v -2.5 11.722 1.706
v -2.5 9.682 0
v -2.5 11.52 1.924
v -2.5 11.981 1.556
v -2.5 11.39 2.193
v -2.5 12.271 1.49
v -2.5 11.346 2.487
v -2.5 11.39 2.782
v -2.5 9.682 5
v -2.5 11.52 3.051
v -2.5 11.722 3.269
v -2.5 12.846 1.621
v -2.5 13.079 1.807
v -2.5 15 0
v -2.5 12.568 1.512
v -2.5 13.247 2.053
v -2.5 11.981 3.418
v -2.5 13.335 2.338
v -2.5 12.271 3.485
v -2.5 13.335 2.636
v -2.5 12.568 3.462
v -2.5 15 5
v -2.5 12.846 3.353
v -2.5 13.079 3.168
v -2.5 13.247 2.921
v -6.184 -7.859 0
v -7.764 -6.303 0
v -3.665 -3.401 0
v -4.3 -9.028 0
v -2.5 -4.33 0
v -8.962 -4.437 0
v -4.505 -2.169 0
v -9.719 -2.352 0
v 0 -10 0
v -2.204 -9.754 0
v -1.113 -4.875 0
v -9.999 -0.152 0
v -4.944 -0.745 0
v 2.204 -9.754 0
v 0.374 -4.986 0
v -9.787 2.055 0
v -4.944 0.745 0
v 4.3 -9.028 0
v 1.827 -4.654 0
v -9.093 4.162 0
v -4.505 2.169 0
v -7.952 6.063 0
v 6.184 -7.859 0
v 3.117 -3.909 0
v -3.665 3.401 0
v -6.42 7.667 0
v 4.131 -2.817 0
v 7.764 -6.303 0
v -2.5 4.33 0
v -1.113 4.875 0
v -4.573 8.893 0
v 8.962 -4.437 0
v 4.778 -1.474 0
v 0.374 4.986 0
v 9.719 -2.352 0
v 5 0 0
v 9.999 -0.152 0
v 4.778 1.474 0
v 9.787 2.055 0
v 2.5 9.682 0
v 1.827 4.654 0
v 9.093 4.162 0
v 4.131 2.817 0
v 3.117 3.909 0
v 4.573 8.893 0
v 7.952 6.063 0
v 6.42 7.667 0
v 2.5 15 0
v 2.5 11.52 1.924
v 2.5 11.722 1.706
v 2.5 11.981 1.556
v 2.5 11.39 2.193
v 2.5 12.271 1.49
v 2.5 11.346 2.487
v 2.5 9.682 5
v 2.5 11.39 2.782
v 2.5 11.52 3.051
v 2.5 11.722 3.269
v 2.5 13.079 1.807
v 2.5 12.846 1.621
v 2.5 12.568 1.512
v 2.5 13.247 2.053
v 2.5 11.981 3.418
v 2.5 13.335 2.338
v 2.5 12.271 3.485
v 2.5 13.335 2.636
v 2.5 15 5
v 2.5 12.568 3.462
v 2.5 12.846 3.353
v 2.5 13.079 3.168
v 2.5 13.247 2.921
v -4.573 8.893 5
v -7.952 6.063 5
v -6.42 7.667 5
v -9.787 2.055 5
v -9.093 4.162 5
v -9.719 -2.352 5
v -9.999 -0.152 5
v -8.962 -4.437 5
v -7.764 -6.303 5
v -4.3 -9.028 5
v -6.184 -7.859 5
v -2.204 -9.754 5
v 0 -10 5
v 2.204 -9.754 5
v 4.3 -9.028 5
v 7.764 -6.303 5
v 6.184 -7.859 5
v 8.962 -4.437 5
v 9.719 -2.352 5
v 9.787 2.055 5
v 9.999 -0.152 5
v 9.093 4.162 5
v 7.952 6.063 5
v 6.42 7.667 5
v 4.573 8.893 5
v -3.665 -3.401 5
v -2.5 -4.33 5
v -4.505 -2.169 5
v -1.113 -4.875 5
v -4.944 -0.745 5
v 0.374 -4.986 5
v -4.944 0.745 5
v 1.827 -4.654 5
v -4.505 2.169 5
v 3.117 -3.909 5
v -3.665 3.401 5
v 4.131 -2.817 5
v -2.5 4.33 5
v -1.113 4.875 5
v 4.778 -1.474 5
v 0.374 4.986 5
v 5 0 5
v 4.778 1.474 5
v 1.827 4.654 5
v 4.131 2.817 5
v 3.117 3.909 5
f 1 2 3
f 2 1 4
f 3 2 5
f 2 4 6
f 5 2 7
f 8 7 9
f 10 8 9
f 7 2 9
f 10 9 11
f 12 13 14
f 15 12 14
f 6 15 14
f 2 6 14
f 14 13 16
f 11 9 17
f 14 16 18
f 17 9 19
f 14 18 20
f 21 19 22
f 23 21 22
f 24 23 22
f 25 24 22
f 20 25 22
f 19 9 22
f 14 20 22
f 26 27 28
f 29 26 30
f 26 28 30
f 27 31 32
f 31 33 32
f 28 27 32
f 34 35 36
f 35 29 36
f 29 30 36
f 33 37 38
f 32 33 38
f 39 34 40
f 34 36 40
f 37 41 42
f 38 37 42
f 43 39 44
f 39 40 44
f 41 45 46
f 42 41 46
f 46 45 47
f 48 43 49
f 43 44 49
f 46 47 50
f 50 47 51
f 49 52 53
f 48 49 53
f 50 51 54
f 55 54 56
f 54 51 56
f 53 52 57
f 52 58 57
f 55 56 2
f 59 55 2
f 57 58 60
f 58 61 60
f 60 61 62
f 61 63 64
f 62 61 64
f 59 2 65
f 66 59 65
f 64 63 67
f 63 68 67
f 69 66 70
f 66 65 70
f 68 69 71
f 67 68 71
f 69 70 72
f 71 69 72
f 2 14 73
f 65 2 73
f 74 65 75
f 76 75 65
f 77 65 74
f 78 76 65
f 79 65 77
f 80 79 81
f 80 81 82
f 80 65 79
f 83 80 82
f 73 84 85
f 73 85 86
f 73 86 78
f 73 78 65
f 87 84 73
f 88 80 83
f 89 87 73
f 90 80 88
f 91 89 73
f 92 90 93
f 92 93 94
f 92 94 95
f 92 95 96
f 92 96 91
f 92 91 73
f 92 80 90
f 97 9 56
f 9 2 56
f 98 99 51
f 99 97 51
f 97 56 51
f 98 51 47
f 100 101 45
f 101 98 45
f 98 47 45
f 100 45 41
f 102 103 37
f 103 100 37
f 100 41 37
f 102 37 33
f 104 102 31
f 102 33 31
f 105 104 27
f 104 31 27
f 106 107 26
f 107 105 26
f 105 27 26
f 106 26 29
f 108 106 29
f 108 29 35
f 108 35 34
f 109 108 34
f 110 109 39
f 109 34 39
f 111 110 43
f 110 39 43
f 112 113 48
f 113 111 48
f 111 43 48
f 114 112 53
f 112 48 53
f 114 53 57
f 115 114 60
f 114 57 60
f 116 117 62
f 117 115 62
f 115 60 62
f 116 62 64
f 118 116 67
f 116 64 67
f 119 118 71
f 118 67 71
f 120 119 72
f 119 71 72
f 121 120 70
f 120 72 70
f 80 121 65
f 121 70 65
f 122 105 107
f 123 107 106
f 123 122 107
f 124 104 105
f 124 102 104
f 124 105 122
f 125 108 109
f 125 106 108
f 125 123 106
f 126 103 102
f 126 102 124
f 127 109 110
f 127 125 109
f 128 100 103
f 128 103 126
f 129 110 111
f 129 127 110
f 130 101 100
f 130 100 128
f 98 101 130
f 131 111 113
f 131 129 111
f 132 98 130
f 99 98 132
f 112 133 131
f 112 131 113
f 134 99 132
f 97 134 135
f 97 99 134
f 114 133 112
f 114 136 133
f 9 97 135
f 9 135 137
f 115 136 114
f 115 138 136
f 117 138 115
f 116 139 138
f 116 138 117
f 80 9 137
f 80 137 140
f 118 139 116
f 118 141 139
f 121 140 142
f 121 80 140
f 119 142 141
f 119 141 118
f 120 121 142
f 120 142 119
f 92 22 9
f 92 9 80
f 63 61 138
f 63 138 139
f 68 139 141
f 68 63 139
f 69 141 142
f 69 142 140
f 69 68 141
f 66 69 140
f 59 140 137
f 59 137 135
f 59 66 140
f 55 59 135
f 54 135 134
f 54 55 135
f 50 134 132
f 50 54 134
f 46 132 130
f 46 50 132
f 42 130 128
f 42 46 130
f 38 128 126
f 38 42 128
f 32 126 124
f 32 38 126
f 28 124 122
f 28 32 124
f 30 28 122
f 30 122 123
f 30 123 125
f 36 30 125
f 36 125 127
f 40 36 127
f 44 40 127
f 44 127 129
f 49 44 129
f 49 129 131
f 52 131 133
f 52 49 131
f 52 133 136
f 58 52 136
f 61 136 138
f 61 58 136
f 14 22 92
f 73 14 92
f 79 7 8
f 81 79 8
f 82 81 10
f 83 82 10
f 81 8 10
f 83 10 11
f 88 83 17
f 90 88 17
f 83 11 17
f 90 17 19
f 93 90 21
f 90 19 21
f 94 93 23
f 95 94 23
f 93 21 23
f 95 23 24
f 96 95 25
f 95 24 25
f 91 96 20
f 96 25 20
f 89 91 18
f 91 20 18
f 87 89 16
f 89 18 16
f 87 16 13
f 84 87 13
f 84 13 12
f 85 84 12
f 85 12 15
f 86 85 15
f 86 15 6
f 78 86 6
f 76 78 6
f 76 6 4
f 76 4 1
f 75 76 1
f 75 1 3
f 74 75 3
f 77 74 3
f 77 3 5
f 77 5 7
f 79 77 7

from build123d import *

# Parameters (mm, degrees)
ESQUISSE1_R             = 10
ESQUISSE1_R_2           = 5
BOSS_EXTRU_1_DEPTH      = 5
ESQUISSE2_W             = 5
ESQUISSE2_H             = 7
BOSS_EXTRU_2_DEPTH      = 5
ESQUISSE3_R             = 1
ENL_V_MAT_EXTRU_1_DEPTH = 10


with BuildPart() as part:
    # Esquisse1 → Boss.-Extru.1 (new body)
    with BuildSketch(Plane.XY):
        Circle(ESQUISSE1_R)
        Circle(ESQUISSE1_R_2, mode=Mode.SUBTRACT)
    extrude(amount=BOSS_EXTRU_1_DEPTH)

    # Esquisse2 → Boss.-Extru.2 (add)
    with BuildSketch(Plane.XY.offset(5)):
        with Locations((0, 11.5)):
            Rectangle(ESQUISSE2_W, ESQUISSE2_H)
    extrude(amount=-BOSS_EXTRU_2_DEPTH)

    # Esquisse3 → Enlèv. mat.-Extru.1 (cut)
    with BuildSketch(Plane(origin=(-2.5, 0, 0), x_dir=(0, -1, 0), z_dir=(-1, 0, 0))):
        with Locations((-12.345891544, 2.487364075)):
            Circle(ESQUISSE3_R)
    extrude(amount=-ENL_V_MAT_EXTRU_1_DEPTH, mode=Mode.SUBTRACT)


solid = part.part
